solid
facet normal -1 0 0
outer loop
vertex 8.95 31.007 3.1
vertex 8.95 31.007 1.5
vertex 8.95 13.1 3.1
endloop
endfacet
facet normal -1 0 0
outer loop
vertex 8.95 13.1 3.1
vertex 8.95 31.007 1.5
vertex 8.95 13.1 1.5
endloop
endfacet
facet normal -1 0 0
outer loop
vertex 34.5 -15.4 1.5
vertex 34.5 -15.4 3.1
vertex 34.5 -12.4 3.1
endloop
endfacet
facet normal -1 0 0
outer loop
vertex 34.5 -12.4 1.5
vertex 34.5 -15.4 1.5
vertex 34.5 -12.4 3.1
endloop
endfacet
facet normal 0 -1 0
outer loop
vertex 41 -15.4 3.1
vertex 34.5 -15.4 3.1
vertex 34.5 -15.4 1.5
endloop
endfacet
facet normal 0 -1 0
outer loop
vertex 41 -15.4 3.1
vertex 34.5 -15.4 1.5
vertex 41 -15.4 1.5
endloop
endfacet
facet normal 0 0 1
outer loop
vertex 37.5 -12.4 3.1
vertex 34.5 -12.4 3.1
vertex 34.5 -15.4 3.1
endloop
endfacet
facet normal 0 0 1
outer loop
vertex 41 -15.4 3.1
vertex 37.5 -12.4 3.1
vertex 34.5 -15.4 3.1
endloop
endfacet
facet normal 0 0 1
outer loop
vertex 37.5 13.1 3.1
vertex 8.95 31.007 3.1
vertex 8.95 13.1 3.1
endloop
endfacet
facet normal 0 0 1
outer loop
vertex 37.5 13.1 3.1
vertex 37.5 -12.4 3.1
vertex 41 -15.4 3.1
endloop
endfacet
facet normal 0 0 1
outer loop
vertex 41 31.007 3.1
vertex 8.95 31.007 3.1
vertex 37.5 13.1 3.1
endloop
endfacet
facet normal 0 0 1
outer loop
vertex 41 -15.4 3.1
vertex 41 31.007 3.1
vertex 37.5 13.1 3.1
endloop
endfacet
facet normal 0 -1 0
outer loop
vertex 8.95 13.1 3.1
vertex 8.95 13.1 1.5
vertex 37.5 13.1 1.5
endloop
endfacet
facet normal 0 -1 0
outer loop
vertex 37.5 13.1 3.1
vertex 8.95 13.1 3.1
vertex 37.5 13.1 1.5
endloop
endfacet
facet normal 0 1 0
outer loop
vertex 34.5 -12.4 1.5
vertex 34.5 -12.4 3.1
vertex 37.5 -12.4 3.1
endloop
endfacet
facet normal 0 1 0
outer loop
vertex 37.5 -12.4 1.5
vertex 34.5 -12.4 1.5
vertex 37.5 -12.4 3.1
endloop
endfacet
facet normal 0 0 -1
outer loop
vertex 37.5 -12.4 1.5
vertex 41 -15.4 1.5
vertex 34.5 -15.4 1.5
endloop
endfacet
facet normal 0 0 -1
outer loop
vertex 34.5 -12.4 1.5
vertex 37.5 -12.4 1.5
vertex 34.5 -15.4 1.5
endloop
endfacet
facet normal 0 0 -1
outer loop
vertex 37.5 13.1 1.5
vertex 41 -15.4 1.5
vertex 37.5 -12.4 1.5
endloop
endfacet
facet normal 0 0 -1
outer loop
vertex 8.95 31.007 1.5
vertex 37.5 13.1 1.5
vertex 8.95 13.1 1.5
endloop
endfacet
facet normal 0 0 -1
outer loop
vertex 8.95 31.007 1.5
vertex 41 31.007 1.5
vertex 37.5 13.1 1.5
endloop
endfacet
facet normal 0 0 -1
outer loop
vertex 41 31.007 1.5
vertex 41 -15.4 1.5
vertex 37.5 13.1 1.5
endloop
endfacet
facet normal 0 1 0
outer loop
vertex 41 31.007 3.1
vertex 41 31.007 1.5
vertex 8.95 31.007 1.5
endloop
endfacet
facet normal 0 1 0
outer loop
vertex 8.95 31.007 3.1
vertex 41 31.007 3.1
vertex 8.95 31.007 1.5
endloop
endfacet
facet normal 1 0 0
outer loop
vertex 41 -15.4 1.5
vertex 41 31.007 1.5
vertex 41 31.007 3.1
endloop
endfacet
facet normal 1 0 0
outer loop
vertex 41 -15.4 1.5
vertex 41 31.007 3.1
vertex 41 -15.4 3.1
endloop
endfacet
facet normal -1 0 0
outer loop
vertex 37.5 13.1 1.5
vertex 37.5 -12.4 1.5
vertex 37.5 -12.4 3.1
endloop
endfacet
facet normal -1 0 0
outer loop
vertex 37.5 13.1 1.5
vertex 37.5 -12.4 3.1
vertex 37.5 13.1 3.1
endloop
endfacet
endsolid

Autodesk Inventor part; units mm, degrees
ref_plane "YZ Plane" through (0, 0, 0) normal (1, 0, 0) x (0, 1, 0)
ref_plane "XZ Plane" through (0, 0, 0) normal (0, 1, 0) x (-1, 0, 0)
ref_plane "XY Plane" through (0, 0, 0) normal (0, 0, 1) x (1, 0, 0)
sketch "Sketch1" plane through (0, 0, 0) normal (0, 0, 1) x (1, 0, 0)
  line L0 (12.5, -5.24) -> (15, -5.24) projected
  line L1 (15, -5.24) -> (15, -10.24) projected
  line L2 (15, -10.24) -> (12.5, -10.24) projected
  arc A0 (12.5, -5.24) -> (12.5, -10.24) centre (12.5, -7.74) ccw projected
  line L3 (-15, -5.24) -> (-12.5, -5.24) projected
  arc A1 (-12.5, -10.24) -> (-12.5, -5.24) centre (-12.5, -7.74) ccw projected
  line L4 (-12.5, -10.24) -> (-15, -10.24) projected
  line L5 (-15, -10.24) -> (-15, -5.24) projected
  circle A2 centre (-7.5, -12.2) radius 1.75 projected
  circle A3 centre (7.5, -12.2) radius 1.75 projected
  line L6 (2.4, 25.954) -> (2.4, 24.254) projected
  line L7 (4, 25.954) -> (2.4, 25.954) projected
  line L8 (4, 24.254) -> (4, 25.954) projected
  line L9 (50, 22.6643) -> (44, 22.6643) projected
  line L10 (44, 22.6643) -> (44, -4.7413) projected
  arc A4 (44, -9.7413) -> (44, -4.7413) centre (44, -7.2413) ccw projected
  line L11 (44, -9.7413) -> (44, -18.8012) projected
  line L12 (44, -18.8012) -> (50, -18.8012) projected
  line L13 (50, -18.8012) -> (50, 22.6643) projected
  line L14 (40.2471, -8.6254) -> (44, -18.8012) projected
  line L15 (44, -9.7413) -> (44, -18.8012) projected
  arc A5 (44, -4.7413) -> (44, -9.7413) centre (44, -7.2413) ccw projected
  line L16 (44, 4.3187) -> (44, -4.7413) projected
  line L17 (44, 4.3187) -> (40.2471, -5.8572) projected
  arc A6 (40.2471, -5.8572) -> (40.2471, -8.6254) centre (44, -7.2413) ccw projected
  line L18 (8.95, 13.1005) -> (37.5, 13.1005)
  line L19 (37.5, 13.1005) -> (37.5, 31.0066)
  line L20 (37.5, 31.0066) -> (8.95, 31.0066)
  line L21 (8.95, 31.0066) -> (8.95, 13.1005)
  line L22 (44, 18.1772) -> (41, 18.1772)
  line L23 (41, 18.1772) -> (41, 7.8033)
  line L24 (41, 7.8033) -> (44, 7.8033)
  line L25 (44, 7.8033) -> (44, 18.1772)
  line L26 (37.5, 31.0066) -> (41, 31.0066)
  line L27 (41, 31.0066) -> (41, 1.9316)
  line L28 (41, 1.9316) -> (37.5, 1.9316)
  line L29 (37.5, 1.9316) -> (37.5, 31.0066)
  line L30 (8.95, 31.0066) -> (41, 31.0066)
  line L31 (41, 31.0066) -> (41, 23.254)
  line L32 (41, 23.254) -> (8.95, 23.254)
  line L33 (8.95, 23.254) -> (8.95, 31.0066)
  line L34 (17.8602, 13.1005) -> (37.5, 13.1005)
  line L35 (37.5, 13.1005) -> (37.5, -15.4)
  line L36 (37.5, -15.4) -> (17.8602, -15.4)
  line L37 (17.8602, -15.4) -> (17.8602, 13.1005)
  line L38 (37.5, -15.4) -> (41, -15.4)
  line L39 (41, -15.4) -> (41, 1.9316)
  line L40 (41, 1.9316) -> (37.5, 1.9316)
  line L41 (37.5, 1.9316) -> (37.5, -15.4)
  arc A7 (-17.7252, -6.9095) -> (-17.704, -4.5096) centre (-17.7146, -5.7096) ccw projected
  line L42 (-17.7252, -6.9095) -> (-18.8252, -6.8998) projected
  arc A8 (-18.8039, -4.4999) -> (-18.8252, -6.8998) centre (-18.8145, -5.6998) ccw projected
  line L43 (-18.8039, -4.4999) -> (-17.704, -4.5096) projected
  circle A9 centre (21.3634, 8.1005) radius 1.5 projected
  arc A10 (-17.5172, 16.5895) -> (-17.496, 18.9894) centre (-17.5066, 17.7895) ccw projected
  line L44 (-17.5172, 16.5895) -> (-18.6172, 16.5993) projected
  arc A11 (-18.5959, 18.9992) -> (-18.6172, 16.5993) centre (-18.6065, 17.7992) ccw projected
  line L45 (-18.5959, 18.9992) -> (-17.496, 18.9894) projected
  circle A12 centre (34, -10.4) radius 1.5 projected
  arc A13 (36.5, 15.1772) -> (34.5, 17.1772) centre (34.5, 15.1772) ccw projected
  line L46 (16.4051, 17.1772) -> (34.5, 17.1772) projected
  arc A14 (12.4051, 21.1772) -> (16.4051, 17.1772) centre (16.4051, 21.1772) ccw projected
  line L47 (12.4051, 28.0066) -> (12.4051, 21.1772) projected
  arc A15 (12.4051, 28.0066) -> (10.4051, 30.0066) centre (10.4051, 28.0066) ccw projected
  line L48 (-18.5665, 30.0066) -> (10.4051, 30.0066) projected
  arc A16 (-18.5665, 30.0066) -> (-20.5665, 28.0066) centre (-18.5665, 28.0066) ccw projected
  line L49 (-20.5665, 18.4539) -> (-20.5665, 28.0066) projected
  arc A17 (-24.5665, 14.4539) -> (-20.5665, 18.4539) centre (-24.5665, 18.4539) ccw projected
  line L50 (-34.5, 14.4539) -> (-24.5665, 14.4539) projected
  arc A18 (-34.5, 14.4539) -> (-36.5, 12.4539) centre (-34.5, 12.4539) ccw projected
  line L51 (-36.5, -12.4) -> (-36.5, 12.4539) projected
  arc A19 (-36.5, -12.4) -> (-34.5, -14.4) centre (-34.5, -12.4) ccw projected
  line L52 (34.5, -14.4) -> (-34.5, -14.4) projected
  arc A20 (34.5, -14.4) -> (36.5, -12.4) centre (34.5, -12.4) ccw projected
  line L53 (36.5, 15.1772) -> (36.5, -12.4) projected
  line L54 (5.95, 24.254) -> (4, 24.254) projected
  arc A21 (9.95, 20.254) -> (5.95, 24.254) centre (5.95, 20.254) ccw projected
  line L55 (9.95, 16.1005) -> (9.95, 20.254) projected
  arc A22 (9.95, 16.1005) -> (11.95, 14.1005) centre (11.95, 16.1005) ccw projected
  line L56 (14.8602, 14.1005) -> (11.95, 14.1005) projected
  arc A23 (18.8602, 10.1005) -> (14.8602, 14.1005) centre (14.8602, 10.1005) ccw projected
  line L57 (18.8602, -0.2) -> (18.8602, 10.1005) projected
  arc A24 (14.8602, -4.2) -> (18.8602, -0.2) centre (14.8602, -0.2) ccw projected
  line L58 (12.1354, -4.2) -> (14.8602, -4.2) projected
  arc A25 (12.1354, -4.2) -> (11.1485, -4.4605) centre (12.1354, -6.2) ccw projected
  line L59 (7.9105, -6.2976) -> (11.1485, -4.4605) projected
  arc A26 (5.9366, -6.8186) -> (7.9105, -6.2976) centre (5.9366, -2.8186) ccw projected
  line L60 (-5.9366, -6.8186) -> (5.9366, -6.8186) projected
  arc A27 (-7.9105, -6.2976) -> (-5.9366, -6.8186) centre (-5.9366, -2.8186) ccw projected
  line L61 (-11.1485, -4.4605) -> (-7.9105, -6.2976) projected
  arc A28 (-11.1485, -4.4605) -> (-12.1354, -4.2) centre (-12.1354, -6.2) ccw projected
  line L62 (-14.8602, -4.2) -> (-12.1354, -4.2) projected
  arc A29 (-18.8602, -0.2) -> (-14.8602, -4.2) centre (-14.8602, -0.2) ccw projected
  line L63 (-18.8602, 10.3433) -> (-18.8602, -0.2) projected
  arc A30 (-15.9867, 14.1814) -> (-18.8602, 10.3433) centre (-14.8602, 10.3433) ccw projected
  arc A31 (-15.9867, 14.1814) -> (-14.55, 16.1005) centre (-16.55, 16.1005) ccw projected
  line L64 (-14.55, 20.254) -> (-14.55, 16.1005) projected
  arc A32 (-10.55, 24.254) -> (-14.55, 20.254) centre (-10.55, 20.254) ccw projected
  line L65 (2.4, 24.254) -> (-10.55, 24.254) projected
  point P0 (0, 0)
  point P1 (41, -3.8157)
  point P2 (41, -10.6668)
  dimension "d0" = 3
extrude "Extrusion1" add sketch "Sketch1" along normal blind 3.1 contours A21 L55 A22 L56 A23 L18 L21 | L21 L32 L47 A14 L46 A13 L53 L18 A23 L56 A22 L55 A21 | L21 L48 A15 L47 L32 | L21 L20 L19 L32 L47 A15 L48 | L32 L19 L18 L53 A13 L46 A14 L47 | L32 L27 L23 L28 L29 L19 | L19 L26 L27 L32
sketch "Sketch2" plane through (0, 0, 0) normal (0, 0, -1) x (-1, 0, 0)
  line L0 (-8.95, 31.0066) -> (-8.95, 13.1005) projected
  line L1 (-41, 1.9316) -> (-41, 31.0066) projected
  line L2 (-37.5, 1.9316) -> (-41, 1.9316) projected
  line L3 (-41, 31.0066) -> (-8.95, 31.0066) projected
  line L4 (-37.5, 13.1005) -> (-37.5, 1.9316) projected
  line L5 (-8.95, 13.1005) -> (-37.5, 13.1005) projected
  point P0 (0, 0)
extrude "Extrusion2" cut sketch "Sketch2" against normal blind 1.5
sketch "Sketch3" plane through (41, -3.8157, 3.1) normal (1, 0, 0) x (0, 0, -1)
  line L0 (38.317, 76.7923) -> (28.0867, 64.6003) projected
  line L1 (-3.9, -14.9855) -> (-3.9, 26.48) projected
  line L2 (-3.9, -14.9855) -> (7.1, -14.9855) projected
  line L3 (7.1, -14.9855) -> (7.1, 1.1145) projected
  arc A0 (25.2, 19.2145) -> (7.1, 1.1145) centre (25.2, 1.1145) ccw projected
  line L4 (25.2, 19.2145) -> (36.2, 19.2145) projected
  line L5 (1.6, 5.7473) -> (1.6, 34.8223) projected
  line L6 (1.6, 34.8223) -> (0, 34.8223) projected
  line L7 (0, 5.7473) -> (0, 34.8223) projected
  line L8 (0, 0) -> (0, 34.8223) projected
  line L9 (0, 30.197) -> (1.6, 30.197)
  line L10 (28.0867, 30.906) -> (23.6867, 30.906) projected
  line L11 (23.6867, 30.906) -> (23.6867, 44.6714) projected
  line L12 (23.6867, 44.6714) -> (28.0867, 44.6714) projected
  line L13 (28.0867, 44.6714) -> (28.0867, 30.906) projected
  line L14 (28.0867, 64.6003) -> (28.0867, 59.2448) projected
  line L15 (36.2, 19.2145) -> (36.2, 63.075) projected
  line L16 (36.2, 63.075) -> (39.2, 63.075) projected
  line L17 (39.2, 63.075) -> (39.2, 76.4709) projected
  line L18 (23.5929, 59.2448) -> (-3.9, 26.48) projected
  arc A1 (39.2, 76.4709) -> (38.317, 76.7923) centre (38.7, 76.4709) ccw projected
  line L19 (23.5929, 59.2448) -> (28.0867, 59.2448) projected
  line L20 (11.8485, 39.6478) -> (14.4531, 37.4623) projected
  line L21 (14.4531, 37.4623) -> (10.9819, 33.3255) projected
  line L22 (10.9819, 33.3255) -> (8.3773, 35.511) projected
  line L23 (11.8485, 39.6478) -> (8.3773, 35.511) projected
  line L24 (1.6, 5.7473) -> (0, 5.7473) projected
  point P0 (3.1, 3.8157)
  point P1 (36.2, 74.2694)
extrude "Extrusion3" [suppressed]
sketch "Sketch4" plane through (0, 0, 3.1) normal (0, 0, 1) x (1, 0, 0)
  line L0 (31.7, -15.7) -> (31.7, 9.3) projected
  line L1 (41, -15.4) -> (41, -10.6668) projected
  line L2 (41, -3.8157) -> (41, -10.6668)
  line L3 (37.5, 1.9316) -> (41, 1.9316) projected
  line L4 (41, 31.0066) -> (8.95, 31.0066) projected
  line L5 (8.95, 31.0066) -> (8.95, 13.1005) projected
  line L6 (8.95, 13.1005) -> (37.5, 13.1005) projected
  line L7 (37.5, 13.1005) -> (37.5, 1.9316) projected
  line L8 (41, 1.9316) -> (41, 31.0066) projected
  point P0 (0, 0)
extrude "Extrusion4" [suppressed]
sketch "Sketch5" plane through (0, 0, 3.1) normal (0, 0, 1) x (1, 0, 0)
  line L0 (15, 8.3373) -> (15, -1.2152) projected
  line L1 (8.95, 13.1005) -> (17.8602, 13.1005) projected
  line L2 (17.8602, 13.1005) -> (16.3634, 13.1005)
  line L3 (16.3634, 13.1005) -> (16.3634, -15.4)
  line L4 (16.3634, -15.4) -> (17.8602, -15.4)
  line L5 (17.8602, -15.4) -> (17.8602, 13.1005)
  line L6 (37.5, 1.9316) -> (41, 1.9316) projected
  line L7 (41, 31.0066) -> (8.95, 31.0066) projected
  line L8 (8.95, 31.0066) -> (8.95, 13.1005) projected
  line L9 (8.95, 13.1005) -> (37.5, 13.1005) projected
  line L10 (37.5, 13.1005) -> (37.5, 1.9316) projected
  line L11 (41, 1.9316) -> (41, 31.0066) projected
  point P0 (0, 0)
extrude "Extrusion5" [suppressed]
sketch "Sketch6" plane through (0, 0, 3.1) normal (0, 0, 1) x (1, 0, 0)
  line L0 (16.3634, -15.4) -> (41, -15.4) projected
  line L1 (28.6817, -15.4) -> (28.6817, 26.3813)
  line L2 (41, 26.3813) -> (8.95, 26.3813) projected
  line L3 (28.6817, -15.4) -> (28.6817, -9.9)
  line L4 (28.6817, 26.3813) -> (28.6817, 20.8813)
  line L5 (16.3634, 13.1005) -> (41, 13.1005)
  line L6 (41, -15.4) -> (41, 26.3813) projected
  line L7 (16.3634, 13.1005) -> (21.3634, 13.1005)
  line L8 (21.3634, 13.1005) -> (21.3634, 8.1005)
  line L9 (21.3634, 8.1005) -> (16.3634, 8.1005)
  line L10 (16.3634, 8.1005) -> (16.3634, 13.1005)
  line L11 (41, -15.4) -> (36, -15.4)
  line L12 (36, -15.4) -> (36, -10.4)
  line L13 (36, -10.4) -> (41, -10.4)
  line L14 (41, -10.4) -> (41, -15.4)
  circle A0 centre (21.3634, 8.1005) radius 1.5
  circle A1 centre (36, -10.4) radius 1.5
  line L15 (37.5, 1.9316) -> (41, 1.9316) projected
  line L16 (41, 31.0066) -> (8.95, 31.0066) projected
  line L17 (8.95, 31.0066) -> (8.95, 13.1005) projected
  line L18 (8.95, 13.1005) -> (37.5, 13.1005) projected
  line L19 (37.5, 13.1005) -> (37.5, 1.9316) projected
  line L20 (41, 1.9316) -> (41, 31.0066) projected
  point P0 (0, 0)
  dimension "d11" = 5.5
  dimension "d12" = 5.5
  dimension "d13" = 5
  dimension "d14" = 5
  dimension "d15" = 5
  dimension "d16" = 5
  dimension "d17" = 3
  dimension "d18" = 3
extrude "Extrusion6" cut sketch "Sketch6" against normal blind 1.6 contours A1 L13 L12 | L12 L13 A1 | A0 L9 L8 | L8 L9 A0
sketch "Sketch8" plane through (0, 0, 3.1) normal (0, 0, 1) x (1, 0, 0)
  line L0 (36, -10.4) -> (34, -10.4)
  circle A0 centre (34, -10.4) radius 1.5
  line L1 (37.5, 1.9316) -> (41, 1.9316) projected
  line L2 (41, 31.0066) -> (8.95, 31.0066) projected
  line L3 (8.95, 31.0066) -> (8.95, 13.1005) projected
  line L4 (8.95, 13.1005) -> (37.5, 13.1005) projected
  line L5 (37.5, 13.1005) -> (37.5, 1.9316) projected
  line L6 (41, 1.9316) -> (41, 31.0066) projected
  point P0 (0, 0)
  dimension "d21" = 2
extrude "Extrusion7" [suppressed]
extrude "Extrusion8" cut sketch "Sketch8" against normal blind 1.6 contours A0
sketch "Sketch9" plane through (0, 0, 3.1) normal (0, 0, 1) x (1, 0, 0)
  line L0 (37.5, 1.9316) -> (41, 1.9316) projected
  line L1 (8.95, 13.1005) -> (41, 13.1005)
  line L2 (41, 13.1005) -> (41, 26.3813)
  line L3 (41, 26.3813) -> (8.95, 26.3813)
  line L4 (8.95, 26.3813) -> (8.95, 13.1005)
  line L5 (41, 31.0066) -> (8.95, 31.0066) projected
  line L6 (8.95, 31.0066) -> (8.95, 13.1005) projected
  line L7 (8.95, 13.1005) -> (37.5, 13.1005) projected
  line L8 (37.5, 13.1005) -> (37.5, 1.9316) projected
  line L9 (41, 1.9316) -> (41, 31.0066) projected
  point P0 (0, 0)
extrude "Extrusion9" [suppressed]
sketch "Sketch10" plane through (0, 0, 3.1) normal (0, 0, 1) x (1, 0, 0)
  line L0 (37.5, 1.9316) -> (41, 1.9316) projected
  line L1 (41, 1.9316) -> (37.5, 1.9316)
  line L2 (37.5, 1.9316) -> (37.5, -15.4)
  line L3 (37.5, -15.4) -> (41, -15.4)
  line L4 (41, -15.4) -> (41, 1.9316)
  arc A0 (34.5, -15.4) -> (37.5, -12.4) centre (34.5, -12.4) ccw projected
  line L5 (37.5, -15.4) -> (34.5, -15.4)
  line L6 (34.5, -15.4) -> (34.5, -12.4)
  line L7 (34.5, -12.4) -> (37.5, -12.4)
  line L8 (37.5, -12.4) -> (37.5, -15.4)
  line L9 (41, 31.0066) -> (8.95, 31.0066) projected
  line L10 (8.95, 31.0066) -> (8.95, 13.1005) projected
  line L11 (8.95, 13.1005) -> (37.5, 13.1005) projected
  line L12 (37.5, 13.1005) -> (37.5, 1.9316) projected
  line L13 (41, 1.9316) -> (41, 31.0066) projected
  point P0 (0, 0)
extrude "Extrusion10" add sketch "Sketch10" against normal blind 1.6 contours L0 L4 L3 L2 | L2 L5 A0 | A0 L6 L7
properties part number "PCB_2_Miras"
